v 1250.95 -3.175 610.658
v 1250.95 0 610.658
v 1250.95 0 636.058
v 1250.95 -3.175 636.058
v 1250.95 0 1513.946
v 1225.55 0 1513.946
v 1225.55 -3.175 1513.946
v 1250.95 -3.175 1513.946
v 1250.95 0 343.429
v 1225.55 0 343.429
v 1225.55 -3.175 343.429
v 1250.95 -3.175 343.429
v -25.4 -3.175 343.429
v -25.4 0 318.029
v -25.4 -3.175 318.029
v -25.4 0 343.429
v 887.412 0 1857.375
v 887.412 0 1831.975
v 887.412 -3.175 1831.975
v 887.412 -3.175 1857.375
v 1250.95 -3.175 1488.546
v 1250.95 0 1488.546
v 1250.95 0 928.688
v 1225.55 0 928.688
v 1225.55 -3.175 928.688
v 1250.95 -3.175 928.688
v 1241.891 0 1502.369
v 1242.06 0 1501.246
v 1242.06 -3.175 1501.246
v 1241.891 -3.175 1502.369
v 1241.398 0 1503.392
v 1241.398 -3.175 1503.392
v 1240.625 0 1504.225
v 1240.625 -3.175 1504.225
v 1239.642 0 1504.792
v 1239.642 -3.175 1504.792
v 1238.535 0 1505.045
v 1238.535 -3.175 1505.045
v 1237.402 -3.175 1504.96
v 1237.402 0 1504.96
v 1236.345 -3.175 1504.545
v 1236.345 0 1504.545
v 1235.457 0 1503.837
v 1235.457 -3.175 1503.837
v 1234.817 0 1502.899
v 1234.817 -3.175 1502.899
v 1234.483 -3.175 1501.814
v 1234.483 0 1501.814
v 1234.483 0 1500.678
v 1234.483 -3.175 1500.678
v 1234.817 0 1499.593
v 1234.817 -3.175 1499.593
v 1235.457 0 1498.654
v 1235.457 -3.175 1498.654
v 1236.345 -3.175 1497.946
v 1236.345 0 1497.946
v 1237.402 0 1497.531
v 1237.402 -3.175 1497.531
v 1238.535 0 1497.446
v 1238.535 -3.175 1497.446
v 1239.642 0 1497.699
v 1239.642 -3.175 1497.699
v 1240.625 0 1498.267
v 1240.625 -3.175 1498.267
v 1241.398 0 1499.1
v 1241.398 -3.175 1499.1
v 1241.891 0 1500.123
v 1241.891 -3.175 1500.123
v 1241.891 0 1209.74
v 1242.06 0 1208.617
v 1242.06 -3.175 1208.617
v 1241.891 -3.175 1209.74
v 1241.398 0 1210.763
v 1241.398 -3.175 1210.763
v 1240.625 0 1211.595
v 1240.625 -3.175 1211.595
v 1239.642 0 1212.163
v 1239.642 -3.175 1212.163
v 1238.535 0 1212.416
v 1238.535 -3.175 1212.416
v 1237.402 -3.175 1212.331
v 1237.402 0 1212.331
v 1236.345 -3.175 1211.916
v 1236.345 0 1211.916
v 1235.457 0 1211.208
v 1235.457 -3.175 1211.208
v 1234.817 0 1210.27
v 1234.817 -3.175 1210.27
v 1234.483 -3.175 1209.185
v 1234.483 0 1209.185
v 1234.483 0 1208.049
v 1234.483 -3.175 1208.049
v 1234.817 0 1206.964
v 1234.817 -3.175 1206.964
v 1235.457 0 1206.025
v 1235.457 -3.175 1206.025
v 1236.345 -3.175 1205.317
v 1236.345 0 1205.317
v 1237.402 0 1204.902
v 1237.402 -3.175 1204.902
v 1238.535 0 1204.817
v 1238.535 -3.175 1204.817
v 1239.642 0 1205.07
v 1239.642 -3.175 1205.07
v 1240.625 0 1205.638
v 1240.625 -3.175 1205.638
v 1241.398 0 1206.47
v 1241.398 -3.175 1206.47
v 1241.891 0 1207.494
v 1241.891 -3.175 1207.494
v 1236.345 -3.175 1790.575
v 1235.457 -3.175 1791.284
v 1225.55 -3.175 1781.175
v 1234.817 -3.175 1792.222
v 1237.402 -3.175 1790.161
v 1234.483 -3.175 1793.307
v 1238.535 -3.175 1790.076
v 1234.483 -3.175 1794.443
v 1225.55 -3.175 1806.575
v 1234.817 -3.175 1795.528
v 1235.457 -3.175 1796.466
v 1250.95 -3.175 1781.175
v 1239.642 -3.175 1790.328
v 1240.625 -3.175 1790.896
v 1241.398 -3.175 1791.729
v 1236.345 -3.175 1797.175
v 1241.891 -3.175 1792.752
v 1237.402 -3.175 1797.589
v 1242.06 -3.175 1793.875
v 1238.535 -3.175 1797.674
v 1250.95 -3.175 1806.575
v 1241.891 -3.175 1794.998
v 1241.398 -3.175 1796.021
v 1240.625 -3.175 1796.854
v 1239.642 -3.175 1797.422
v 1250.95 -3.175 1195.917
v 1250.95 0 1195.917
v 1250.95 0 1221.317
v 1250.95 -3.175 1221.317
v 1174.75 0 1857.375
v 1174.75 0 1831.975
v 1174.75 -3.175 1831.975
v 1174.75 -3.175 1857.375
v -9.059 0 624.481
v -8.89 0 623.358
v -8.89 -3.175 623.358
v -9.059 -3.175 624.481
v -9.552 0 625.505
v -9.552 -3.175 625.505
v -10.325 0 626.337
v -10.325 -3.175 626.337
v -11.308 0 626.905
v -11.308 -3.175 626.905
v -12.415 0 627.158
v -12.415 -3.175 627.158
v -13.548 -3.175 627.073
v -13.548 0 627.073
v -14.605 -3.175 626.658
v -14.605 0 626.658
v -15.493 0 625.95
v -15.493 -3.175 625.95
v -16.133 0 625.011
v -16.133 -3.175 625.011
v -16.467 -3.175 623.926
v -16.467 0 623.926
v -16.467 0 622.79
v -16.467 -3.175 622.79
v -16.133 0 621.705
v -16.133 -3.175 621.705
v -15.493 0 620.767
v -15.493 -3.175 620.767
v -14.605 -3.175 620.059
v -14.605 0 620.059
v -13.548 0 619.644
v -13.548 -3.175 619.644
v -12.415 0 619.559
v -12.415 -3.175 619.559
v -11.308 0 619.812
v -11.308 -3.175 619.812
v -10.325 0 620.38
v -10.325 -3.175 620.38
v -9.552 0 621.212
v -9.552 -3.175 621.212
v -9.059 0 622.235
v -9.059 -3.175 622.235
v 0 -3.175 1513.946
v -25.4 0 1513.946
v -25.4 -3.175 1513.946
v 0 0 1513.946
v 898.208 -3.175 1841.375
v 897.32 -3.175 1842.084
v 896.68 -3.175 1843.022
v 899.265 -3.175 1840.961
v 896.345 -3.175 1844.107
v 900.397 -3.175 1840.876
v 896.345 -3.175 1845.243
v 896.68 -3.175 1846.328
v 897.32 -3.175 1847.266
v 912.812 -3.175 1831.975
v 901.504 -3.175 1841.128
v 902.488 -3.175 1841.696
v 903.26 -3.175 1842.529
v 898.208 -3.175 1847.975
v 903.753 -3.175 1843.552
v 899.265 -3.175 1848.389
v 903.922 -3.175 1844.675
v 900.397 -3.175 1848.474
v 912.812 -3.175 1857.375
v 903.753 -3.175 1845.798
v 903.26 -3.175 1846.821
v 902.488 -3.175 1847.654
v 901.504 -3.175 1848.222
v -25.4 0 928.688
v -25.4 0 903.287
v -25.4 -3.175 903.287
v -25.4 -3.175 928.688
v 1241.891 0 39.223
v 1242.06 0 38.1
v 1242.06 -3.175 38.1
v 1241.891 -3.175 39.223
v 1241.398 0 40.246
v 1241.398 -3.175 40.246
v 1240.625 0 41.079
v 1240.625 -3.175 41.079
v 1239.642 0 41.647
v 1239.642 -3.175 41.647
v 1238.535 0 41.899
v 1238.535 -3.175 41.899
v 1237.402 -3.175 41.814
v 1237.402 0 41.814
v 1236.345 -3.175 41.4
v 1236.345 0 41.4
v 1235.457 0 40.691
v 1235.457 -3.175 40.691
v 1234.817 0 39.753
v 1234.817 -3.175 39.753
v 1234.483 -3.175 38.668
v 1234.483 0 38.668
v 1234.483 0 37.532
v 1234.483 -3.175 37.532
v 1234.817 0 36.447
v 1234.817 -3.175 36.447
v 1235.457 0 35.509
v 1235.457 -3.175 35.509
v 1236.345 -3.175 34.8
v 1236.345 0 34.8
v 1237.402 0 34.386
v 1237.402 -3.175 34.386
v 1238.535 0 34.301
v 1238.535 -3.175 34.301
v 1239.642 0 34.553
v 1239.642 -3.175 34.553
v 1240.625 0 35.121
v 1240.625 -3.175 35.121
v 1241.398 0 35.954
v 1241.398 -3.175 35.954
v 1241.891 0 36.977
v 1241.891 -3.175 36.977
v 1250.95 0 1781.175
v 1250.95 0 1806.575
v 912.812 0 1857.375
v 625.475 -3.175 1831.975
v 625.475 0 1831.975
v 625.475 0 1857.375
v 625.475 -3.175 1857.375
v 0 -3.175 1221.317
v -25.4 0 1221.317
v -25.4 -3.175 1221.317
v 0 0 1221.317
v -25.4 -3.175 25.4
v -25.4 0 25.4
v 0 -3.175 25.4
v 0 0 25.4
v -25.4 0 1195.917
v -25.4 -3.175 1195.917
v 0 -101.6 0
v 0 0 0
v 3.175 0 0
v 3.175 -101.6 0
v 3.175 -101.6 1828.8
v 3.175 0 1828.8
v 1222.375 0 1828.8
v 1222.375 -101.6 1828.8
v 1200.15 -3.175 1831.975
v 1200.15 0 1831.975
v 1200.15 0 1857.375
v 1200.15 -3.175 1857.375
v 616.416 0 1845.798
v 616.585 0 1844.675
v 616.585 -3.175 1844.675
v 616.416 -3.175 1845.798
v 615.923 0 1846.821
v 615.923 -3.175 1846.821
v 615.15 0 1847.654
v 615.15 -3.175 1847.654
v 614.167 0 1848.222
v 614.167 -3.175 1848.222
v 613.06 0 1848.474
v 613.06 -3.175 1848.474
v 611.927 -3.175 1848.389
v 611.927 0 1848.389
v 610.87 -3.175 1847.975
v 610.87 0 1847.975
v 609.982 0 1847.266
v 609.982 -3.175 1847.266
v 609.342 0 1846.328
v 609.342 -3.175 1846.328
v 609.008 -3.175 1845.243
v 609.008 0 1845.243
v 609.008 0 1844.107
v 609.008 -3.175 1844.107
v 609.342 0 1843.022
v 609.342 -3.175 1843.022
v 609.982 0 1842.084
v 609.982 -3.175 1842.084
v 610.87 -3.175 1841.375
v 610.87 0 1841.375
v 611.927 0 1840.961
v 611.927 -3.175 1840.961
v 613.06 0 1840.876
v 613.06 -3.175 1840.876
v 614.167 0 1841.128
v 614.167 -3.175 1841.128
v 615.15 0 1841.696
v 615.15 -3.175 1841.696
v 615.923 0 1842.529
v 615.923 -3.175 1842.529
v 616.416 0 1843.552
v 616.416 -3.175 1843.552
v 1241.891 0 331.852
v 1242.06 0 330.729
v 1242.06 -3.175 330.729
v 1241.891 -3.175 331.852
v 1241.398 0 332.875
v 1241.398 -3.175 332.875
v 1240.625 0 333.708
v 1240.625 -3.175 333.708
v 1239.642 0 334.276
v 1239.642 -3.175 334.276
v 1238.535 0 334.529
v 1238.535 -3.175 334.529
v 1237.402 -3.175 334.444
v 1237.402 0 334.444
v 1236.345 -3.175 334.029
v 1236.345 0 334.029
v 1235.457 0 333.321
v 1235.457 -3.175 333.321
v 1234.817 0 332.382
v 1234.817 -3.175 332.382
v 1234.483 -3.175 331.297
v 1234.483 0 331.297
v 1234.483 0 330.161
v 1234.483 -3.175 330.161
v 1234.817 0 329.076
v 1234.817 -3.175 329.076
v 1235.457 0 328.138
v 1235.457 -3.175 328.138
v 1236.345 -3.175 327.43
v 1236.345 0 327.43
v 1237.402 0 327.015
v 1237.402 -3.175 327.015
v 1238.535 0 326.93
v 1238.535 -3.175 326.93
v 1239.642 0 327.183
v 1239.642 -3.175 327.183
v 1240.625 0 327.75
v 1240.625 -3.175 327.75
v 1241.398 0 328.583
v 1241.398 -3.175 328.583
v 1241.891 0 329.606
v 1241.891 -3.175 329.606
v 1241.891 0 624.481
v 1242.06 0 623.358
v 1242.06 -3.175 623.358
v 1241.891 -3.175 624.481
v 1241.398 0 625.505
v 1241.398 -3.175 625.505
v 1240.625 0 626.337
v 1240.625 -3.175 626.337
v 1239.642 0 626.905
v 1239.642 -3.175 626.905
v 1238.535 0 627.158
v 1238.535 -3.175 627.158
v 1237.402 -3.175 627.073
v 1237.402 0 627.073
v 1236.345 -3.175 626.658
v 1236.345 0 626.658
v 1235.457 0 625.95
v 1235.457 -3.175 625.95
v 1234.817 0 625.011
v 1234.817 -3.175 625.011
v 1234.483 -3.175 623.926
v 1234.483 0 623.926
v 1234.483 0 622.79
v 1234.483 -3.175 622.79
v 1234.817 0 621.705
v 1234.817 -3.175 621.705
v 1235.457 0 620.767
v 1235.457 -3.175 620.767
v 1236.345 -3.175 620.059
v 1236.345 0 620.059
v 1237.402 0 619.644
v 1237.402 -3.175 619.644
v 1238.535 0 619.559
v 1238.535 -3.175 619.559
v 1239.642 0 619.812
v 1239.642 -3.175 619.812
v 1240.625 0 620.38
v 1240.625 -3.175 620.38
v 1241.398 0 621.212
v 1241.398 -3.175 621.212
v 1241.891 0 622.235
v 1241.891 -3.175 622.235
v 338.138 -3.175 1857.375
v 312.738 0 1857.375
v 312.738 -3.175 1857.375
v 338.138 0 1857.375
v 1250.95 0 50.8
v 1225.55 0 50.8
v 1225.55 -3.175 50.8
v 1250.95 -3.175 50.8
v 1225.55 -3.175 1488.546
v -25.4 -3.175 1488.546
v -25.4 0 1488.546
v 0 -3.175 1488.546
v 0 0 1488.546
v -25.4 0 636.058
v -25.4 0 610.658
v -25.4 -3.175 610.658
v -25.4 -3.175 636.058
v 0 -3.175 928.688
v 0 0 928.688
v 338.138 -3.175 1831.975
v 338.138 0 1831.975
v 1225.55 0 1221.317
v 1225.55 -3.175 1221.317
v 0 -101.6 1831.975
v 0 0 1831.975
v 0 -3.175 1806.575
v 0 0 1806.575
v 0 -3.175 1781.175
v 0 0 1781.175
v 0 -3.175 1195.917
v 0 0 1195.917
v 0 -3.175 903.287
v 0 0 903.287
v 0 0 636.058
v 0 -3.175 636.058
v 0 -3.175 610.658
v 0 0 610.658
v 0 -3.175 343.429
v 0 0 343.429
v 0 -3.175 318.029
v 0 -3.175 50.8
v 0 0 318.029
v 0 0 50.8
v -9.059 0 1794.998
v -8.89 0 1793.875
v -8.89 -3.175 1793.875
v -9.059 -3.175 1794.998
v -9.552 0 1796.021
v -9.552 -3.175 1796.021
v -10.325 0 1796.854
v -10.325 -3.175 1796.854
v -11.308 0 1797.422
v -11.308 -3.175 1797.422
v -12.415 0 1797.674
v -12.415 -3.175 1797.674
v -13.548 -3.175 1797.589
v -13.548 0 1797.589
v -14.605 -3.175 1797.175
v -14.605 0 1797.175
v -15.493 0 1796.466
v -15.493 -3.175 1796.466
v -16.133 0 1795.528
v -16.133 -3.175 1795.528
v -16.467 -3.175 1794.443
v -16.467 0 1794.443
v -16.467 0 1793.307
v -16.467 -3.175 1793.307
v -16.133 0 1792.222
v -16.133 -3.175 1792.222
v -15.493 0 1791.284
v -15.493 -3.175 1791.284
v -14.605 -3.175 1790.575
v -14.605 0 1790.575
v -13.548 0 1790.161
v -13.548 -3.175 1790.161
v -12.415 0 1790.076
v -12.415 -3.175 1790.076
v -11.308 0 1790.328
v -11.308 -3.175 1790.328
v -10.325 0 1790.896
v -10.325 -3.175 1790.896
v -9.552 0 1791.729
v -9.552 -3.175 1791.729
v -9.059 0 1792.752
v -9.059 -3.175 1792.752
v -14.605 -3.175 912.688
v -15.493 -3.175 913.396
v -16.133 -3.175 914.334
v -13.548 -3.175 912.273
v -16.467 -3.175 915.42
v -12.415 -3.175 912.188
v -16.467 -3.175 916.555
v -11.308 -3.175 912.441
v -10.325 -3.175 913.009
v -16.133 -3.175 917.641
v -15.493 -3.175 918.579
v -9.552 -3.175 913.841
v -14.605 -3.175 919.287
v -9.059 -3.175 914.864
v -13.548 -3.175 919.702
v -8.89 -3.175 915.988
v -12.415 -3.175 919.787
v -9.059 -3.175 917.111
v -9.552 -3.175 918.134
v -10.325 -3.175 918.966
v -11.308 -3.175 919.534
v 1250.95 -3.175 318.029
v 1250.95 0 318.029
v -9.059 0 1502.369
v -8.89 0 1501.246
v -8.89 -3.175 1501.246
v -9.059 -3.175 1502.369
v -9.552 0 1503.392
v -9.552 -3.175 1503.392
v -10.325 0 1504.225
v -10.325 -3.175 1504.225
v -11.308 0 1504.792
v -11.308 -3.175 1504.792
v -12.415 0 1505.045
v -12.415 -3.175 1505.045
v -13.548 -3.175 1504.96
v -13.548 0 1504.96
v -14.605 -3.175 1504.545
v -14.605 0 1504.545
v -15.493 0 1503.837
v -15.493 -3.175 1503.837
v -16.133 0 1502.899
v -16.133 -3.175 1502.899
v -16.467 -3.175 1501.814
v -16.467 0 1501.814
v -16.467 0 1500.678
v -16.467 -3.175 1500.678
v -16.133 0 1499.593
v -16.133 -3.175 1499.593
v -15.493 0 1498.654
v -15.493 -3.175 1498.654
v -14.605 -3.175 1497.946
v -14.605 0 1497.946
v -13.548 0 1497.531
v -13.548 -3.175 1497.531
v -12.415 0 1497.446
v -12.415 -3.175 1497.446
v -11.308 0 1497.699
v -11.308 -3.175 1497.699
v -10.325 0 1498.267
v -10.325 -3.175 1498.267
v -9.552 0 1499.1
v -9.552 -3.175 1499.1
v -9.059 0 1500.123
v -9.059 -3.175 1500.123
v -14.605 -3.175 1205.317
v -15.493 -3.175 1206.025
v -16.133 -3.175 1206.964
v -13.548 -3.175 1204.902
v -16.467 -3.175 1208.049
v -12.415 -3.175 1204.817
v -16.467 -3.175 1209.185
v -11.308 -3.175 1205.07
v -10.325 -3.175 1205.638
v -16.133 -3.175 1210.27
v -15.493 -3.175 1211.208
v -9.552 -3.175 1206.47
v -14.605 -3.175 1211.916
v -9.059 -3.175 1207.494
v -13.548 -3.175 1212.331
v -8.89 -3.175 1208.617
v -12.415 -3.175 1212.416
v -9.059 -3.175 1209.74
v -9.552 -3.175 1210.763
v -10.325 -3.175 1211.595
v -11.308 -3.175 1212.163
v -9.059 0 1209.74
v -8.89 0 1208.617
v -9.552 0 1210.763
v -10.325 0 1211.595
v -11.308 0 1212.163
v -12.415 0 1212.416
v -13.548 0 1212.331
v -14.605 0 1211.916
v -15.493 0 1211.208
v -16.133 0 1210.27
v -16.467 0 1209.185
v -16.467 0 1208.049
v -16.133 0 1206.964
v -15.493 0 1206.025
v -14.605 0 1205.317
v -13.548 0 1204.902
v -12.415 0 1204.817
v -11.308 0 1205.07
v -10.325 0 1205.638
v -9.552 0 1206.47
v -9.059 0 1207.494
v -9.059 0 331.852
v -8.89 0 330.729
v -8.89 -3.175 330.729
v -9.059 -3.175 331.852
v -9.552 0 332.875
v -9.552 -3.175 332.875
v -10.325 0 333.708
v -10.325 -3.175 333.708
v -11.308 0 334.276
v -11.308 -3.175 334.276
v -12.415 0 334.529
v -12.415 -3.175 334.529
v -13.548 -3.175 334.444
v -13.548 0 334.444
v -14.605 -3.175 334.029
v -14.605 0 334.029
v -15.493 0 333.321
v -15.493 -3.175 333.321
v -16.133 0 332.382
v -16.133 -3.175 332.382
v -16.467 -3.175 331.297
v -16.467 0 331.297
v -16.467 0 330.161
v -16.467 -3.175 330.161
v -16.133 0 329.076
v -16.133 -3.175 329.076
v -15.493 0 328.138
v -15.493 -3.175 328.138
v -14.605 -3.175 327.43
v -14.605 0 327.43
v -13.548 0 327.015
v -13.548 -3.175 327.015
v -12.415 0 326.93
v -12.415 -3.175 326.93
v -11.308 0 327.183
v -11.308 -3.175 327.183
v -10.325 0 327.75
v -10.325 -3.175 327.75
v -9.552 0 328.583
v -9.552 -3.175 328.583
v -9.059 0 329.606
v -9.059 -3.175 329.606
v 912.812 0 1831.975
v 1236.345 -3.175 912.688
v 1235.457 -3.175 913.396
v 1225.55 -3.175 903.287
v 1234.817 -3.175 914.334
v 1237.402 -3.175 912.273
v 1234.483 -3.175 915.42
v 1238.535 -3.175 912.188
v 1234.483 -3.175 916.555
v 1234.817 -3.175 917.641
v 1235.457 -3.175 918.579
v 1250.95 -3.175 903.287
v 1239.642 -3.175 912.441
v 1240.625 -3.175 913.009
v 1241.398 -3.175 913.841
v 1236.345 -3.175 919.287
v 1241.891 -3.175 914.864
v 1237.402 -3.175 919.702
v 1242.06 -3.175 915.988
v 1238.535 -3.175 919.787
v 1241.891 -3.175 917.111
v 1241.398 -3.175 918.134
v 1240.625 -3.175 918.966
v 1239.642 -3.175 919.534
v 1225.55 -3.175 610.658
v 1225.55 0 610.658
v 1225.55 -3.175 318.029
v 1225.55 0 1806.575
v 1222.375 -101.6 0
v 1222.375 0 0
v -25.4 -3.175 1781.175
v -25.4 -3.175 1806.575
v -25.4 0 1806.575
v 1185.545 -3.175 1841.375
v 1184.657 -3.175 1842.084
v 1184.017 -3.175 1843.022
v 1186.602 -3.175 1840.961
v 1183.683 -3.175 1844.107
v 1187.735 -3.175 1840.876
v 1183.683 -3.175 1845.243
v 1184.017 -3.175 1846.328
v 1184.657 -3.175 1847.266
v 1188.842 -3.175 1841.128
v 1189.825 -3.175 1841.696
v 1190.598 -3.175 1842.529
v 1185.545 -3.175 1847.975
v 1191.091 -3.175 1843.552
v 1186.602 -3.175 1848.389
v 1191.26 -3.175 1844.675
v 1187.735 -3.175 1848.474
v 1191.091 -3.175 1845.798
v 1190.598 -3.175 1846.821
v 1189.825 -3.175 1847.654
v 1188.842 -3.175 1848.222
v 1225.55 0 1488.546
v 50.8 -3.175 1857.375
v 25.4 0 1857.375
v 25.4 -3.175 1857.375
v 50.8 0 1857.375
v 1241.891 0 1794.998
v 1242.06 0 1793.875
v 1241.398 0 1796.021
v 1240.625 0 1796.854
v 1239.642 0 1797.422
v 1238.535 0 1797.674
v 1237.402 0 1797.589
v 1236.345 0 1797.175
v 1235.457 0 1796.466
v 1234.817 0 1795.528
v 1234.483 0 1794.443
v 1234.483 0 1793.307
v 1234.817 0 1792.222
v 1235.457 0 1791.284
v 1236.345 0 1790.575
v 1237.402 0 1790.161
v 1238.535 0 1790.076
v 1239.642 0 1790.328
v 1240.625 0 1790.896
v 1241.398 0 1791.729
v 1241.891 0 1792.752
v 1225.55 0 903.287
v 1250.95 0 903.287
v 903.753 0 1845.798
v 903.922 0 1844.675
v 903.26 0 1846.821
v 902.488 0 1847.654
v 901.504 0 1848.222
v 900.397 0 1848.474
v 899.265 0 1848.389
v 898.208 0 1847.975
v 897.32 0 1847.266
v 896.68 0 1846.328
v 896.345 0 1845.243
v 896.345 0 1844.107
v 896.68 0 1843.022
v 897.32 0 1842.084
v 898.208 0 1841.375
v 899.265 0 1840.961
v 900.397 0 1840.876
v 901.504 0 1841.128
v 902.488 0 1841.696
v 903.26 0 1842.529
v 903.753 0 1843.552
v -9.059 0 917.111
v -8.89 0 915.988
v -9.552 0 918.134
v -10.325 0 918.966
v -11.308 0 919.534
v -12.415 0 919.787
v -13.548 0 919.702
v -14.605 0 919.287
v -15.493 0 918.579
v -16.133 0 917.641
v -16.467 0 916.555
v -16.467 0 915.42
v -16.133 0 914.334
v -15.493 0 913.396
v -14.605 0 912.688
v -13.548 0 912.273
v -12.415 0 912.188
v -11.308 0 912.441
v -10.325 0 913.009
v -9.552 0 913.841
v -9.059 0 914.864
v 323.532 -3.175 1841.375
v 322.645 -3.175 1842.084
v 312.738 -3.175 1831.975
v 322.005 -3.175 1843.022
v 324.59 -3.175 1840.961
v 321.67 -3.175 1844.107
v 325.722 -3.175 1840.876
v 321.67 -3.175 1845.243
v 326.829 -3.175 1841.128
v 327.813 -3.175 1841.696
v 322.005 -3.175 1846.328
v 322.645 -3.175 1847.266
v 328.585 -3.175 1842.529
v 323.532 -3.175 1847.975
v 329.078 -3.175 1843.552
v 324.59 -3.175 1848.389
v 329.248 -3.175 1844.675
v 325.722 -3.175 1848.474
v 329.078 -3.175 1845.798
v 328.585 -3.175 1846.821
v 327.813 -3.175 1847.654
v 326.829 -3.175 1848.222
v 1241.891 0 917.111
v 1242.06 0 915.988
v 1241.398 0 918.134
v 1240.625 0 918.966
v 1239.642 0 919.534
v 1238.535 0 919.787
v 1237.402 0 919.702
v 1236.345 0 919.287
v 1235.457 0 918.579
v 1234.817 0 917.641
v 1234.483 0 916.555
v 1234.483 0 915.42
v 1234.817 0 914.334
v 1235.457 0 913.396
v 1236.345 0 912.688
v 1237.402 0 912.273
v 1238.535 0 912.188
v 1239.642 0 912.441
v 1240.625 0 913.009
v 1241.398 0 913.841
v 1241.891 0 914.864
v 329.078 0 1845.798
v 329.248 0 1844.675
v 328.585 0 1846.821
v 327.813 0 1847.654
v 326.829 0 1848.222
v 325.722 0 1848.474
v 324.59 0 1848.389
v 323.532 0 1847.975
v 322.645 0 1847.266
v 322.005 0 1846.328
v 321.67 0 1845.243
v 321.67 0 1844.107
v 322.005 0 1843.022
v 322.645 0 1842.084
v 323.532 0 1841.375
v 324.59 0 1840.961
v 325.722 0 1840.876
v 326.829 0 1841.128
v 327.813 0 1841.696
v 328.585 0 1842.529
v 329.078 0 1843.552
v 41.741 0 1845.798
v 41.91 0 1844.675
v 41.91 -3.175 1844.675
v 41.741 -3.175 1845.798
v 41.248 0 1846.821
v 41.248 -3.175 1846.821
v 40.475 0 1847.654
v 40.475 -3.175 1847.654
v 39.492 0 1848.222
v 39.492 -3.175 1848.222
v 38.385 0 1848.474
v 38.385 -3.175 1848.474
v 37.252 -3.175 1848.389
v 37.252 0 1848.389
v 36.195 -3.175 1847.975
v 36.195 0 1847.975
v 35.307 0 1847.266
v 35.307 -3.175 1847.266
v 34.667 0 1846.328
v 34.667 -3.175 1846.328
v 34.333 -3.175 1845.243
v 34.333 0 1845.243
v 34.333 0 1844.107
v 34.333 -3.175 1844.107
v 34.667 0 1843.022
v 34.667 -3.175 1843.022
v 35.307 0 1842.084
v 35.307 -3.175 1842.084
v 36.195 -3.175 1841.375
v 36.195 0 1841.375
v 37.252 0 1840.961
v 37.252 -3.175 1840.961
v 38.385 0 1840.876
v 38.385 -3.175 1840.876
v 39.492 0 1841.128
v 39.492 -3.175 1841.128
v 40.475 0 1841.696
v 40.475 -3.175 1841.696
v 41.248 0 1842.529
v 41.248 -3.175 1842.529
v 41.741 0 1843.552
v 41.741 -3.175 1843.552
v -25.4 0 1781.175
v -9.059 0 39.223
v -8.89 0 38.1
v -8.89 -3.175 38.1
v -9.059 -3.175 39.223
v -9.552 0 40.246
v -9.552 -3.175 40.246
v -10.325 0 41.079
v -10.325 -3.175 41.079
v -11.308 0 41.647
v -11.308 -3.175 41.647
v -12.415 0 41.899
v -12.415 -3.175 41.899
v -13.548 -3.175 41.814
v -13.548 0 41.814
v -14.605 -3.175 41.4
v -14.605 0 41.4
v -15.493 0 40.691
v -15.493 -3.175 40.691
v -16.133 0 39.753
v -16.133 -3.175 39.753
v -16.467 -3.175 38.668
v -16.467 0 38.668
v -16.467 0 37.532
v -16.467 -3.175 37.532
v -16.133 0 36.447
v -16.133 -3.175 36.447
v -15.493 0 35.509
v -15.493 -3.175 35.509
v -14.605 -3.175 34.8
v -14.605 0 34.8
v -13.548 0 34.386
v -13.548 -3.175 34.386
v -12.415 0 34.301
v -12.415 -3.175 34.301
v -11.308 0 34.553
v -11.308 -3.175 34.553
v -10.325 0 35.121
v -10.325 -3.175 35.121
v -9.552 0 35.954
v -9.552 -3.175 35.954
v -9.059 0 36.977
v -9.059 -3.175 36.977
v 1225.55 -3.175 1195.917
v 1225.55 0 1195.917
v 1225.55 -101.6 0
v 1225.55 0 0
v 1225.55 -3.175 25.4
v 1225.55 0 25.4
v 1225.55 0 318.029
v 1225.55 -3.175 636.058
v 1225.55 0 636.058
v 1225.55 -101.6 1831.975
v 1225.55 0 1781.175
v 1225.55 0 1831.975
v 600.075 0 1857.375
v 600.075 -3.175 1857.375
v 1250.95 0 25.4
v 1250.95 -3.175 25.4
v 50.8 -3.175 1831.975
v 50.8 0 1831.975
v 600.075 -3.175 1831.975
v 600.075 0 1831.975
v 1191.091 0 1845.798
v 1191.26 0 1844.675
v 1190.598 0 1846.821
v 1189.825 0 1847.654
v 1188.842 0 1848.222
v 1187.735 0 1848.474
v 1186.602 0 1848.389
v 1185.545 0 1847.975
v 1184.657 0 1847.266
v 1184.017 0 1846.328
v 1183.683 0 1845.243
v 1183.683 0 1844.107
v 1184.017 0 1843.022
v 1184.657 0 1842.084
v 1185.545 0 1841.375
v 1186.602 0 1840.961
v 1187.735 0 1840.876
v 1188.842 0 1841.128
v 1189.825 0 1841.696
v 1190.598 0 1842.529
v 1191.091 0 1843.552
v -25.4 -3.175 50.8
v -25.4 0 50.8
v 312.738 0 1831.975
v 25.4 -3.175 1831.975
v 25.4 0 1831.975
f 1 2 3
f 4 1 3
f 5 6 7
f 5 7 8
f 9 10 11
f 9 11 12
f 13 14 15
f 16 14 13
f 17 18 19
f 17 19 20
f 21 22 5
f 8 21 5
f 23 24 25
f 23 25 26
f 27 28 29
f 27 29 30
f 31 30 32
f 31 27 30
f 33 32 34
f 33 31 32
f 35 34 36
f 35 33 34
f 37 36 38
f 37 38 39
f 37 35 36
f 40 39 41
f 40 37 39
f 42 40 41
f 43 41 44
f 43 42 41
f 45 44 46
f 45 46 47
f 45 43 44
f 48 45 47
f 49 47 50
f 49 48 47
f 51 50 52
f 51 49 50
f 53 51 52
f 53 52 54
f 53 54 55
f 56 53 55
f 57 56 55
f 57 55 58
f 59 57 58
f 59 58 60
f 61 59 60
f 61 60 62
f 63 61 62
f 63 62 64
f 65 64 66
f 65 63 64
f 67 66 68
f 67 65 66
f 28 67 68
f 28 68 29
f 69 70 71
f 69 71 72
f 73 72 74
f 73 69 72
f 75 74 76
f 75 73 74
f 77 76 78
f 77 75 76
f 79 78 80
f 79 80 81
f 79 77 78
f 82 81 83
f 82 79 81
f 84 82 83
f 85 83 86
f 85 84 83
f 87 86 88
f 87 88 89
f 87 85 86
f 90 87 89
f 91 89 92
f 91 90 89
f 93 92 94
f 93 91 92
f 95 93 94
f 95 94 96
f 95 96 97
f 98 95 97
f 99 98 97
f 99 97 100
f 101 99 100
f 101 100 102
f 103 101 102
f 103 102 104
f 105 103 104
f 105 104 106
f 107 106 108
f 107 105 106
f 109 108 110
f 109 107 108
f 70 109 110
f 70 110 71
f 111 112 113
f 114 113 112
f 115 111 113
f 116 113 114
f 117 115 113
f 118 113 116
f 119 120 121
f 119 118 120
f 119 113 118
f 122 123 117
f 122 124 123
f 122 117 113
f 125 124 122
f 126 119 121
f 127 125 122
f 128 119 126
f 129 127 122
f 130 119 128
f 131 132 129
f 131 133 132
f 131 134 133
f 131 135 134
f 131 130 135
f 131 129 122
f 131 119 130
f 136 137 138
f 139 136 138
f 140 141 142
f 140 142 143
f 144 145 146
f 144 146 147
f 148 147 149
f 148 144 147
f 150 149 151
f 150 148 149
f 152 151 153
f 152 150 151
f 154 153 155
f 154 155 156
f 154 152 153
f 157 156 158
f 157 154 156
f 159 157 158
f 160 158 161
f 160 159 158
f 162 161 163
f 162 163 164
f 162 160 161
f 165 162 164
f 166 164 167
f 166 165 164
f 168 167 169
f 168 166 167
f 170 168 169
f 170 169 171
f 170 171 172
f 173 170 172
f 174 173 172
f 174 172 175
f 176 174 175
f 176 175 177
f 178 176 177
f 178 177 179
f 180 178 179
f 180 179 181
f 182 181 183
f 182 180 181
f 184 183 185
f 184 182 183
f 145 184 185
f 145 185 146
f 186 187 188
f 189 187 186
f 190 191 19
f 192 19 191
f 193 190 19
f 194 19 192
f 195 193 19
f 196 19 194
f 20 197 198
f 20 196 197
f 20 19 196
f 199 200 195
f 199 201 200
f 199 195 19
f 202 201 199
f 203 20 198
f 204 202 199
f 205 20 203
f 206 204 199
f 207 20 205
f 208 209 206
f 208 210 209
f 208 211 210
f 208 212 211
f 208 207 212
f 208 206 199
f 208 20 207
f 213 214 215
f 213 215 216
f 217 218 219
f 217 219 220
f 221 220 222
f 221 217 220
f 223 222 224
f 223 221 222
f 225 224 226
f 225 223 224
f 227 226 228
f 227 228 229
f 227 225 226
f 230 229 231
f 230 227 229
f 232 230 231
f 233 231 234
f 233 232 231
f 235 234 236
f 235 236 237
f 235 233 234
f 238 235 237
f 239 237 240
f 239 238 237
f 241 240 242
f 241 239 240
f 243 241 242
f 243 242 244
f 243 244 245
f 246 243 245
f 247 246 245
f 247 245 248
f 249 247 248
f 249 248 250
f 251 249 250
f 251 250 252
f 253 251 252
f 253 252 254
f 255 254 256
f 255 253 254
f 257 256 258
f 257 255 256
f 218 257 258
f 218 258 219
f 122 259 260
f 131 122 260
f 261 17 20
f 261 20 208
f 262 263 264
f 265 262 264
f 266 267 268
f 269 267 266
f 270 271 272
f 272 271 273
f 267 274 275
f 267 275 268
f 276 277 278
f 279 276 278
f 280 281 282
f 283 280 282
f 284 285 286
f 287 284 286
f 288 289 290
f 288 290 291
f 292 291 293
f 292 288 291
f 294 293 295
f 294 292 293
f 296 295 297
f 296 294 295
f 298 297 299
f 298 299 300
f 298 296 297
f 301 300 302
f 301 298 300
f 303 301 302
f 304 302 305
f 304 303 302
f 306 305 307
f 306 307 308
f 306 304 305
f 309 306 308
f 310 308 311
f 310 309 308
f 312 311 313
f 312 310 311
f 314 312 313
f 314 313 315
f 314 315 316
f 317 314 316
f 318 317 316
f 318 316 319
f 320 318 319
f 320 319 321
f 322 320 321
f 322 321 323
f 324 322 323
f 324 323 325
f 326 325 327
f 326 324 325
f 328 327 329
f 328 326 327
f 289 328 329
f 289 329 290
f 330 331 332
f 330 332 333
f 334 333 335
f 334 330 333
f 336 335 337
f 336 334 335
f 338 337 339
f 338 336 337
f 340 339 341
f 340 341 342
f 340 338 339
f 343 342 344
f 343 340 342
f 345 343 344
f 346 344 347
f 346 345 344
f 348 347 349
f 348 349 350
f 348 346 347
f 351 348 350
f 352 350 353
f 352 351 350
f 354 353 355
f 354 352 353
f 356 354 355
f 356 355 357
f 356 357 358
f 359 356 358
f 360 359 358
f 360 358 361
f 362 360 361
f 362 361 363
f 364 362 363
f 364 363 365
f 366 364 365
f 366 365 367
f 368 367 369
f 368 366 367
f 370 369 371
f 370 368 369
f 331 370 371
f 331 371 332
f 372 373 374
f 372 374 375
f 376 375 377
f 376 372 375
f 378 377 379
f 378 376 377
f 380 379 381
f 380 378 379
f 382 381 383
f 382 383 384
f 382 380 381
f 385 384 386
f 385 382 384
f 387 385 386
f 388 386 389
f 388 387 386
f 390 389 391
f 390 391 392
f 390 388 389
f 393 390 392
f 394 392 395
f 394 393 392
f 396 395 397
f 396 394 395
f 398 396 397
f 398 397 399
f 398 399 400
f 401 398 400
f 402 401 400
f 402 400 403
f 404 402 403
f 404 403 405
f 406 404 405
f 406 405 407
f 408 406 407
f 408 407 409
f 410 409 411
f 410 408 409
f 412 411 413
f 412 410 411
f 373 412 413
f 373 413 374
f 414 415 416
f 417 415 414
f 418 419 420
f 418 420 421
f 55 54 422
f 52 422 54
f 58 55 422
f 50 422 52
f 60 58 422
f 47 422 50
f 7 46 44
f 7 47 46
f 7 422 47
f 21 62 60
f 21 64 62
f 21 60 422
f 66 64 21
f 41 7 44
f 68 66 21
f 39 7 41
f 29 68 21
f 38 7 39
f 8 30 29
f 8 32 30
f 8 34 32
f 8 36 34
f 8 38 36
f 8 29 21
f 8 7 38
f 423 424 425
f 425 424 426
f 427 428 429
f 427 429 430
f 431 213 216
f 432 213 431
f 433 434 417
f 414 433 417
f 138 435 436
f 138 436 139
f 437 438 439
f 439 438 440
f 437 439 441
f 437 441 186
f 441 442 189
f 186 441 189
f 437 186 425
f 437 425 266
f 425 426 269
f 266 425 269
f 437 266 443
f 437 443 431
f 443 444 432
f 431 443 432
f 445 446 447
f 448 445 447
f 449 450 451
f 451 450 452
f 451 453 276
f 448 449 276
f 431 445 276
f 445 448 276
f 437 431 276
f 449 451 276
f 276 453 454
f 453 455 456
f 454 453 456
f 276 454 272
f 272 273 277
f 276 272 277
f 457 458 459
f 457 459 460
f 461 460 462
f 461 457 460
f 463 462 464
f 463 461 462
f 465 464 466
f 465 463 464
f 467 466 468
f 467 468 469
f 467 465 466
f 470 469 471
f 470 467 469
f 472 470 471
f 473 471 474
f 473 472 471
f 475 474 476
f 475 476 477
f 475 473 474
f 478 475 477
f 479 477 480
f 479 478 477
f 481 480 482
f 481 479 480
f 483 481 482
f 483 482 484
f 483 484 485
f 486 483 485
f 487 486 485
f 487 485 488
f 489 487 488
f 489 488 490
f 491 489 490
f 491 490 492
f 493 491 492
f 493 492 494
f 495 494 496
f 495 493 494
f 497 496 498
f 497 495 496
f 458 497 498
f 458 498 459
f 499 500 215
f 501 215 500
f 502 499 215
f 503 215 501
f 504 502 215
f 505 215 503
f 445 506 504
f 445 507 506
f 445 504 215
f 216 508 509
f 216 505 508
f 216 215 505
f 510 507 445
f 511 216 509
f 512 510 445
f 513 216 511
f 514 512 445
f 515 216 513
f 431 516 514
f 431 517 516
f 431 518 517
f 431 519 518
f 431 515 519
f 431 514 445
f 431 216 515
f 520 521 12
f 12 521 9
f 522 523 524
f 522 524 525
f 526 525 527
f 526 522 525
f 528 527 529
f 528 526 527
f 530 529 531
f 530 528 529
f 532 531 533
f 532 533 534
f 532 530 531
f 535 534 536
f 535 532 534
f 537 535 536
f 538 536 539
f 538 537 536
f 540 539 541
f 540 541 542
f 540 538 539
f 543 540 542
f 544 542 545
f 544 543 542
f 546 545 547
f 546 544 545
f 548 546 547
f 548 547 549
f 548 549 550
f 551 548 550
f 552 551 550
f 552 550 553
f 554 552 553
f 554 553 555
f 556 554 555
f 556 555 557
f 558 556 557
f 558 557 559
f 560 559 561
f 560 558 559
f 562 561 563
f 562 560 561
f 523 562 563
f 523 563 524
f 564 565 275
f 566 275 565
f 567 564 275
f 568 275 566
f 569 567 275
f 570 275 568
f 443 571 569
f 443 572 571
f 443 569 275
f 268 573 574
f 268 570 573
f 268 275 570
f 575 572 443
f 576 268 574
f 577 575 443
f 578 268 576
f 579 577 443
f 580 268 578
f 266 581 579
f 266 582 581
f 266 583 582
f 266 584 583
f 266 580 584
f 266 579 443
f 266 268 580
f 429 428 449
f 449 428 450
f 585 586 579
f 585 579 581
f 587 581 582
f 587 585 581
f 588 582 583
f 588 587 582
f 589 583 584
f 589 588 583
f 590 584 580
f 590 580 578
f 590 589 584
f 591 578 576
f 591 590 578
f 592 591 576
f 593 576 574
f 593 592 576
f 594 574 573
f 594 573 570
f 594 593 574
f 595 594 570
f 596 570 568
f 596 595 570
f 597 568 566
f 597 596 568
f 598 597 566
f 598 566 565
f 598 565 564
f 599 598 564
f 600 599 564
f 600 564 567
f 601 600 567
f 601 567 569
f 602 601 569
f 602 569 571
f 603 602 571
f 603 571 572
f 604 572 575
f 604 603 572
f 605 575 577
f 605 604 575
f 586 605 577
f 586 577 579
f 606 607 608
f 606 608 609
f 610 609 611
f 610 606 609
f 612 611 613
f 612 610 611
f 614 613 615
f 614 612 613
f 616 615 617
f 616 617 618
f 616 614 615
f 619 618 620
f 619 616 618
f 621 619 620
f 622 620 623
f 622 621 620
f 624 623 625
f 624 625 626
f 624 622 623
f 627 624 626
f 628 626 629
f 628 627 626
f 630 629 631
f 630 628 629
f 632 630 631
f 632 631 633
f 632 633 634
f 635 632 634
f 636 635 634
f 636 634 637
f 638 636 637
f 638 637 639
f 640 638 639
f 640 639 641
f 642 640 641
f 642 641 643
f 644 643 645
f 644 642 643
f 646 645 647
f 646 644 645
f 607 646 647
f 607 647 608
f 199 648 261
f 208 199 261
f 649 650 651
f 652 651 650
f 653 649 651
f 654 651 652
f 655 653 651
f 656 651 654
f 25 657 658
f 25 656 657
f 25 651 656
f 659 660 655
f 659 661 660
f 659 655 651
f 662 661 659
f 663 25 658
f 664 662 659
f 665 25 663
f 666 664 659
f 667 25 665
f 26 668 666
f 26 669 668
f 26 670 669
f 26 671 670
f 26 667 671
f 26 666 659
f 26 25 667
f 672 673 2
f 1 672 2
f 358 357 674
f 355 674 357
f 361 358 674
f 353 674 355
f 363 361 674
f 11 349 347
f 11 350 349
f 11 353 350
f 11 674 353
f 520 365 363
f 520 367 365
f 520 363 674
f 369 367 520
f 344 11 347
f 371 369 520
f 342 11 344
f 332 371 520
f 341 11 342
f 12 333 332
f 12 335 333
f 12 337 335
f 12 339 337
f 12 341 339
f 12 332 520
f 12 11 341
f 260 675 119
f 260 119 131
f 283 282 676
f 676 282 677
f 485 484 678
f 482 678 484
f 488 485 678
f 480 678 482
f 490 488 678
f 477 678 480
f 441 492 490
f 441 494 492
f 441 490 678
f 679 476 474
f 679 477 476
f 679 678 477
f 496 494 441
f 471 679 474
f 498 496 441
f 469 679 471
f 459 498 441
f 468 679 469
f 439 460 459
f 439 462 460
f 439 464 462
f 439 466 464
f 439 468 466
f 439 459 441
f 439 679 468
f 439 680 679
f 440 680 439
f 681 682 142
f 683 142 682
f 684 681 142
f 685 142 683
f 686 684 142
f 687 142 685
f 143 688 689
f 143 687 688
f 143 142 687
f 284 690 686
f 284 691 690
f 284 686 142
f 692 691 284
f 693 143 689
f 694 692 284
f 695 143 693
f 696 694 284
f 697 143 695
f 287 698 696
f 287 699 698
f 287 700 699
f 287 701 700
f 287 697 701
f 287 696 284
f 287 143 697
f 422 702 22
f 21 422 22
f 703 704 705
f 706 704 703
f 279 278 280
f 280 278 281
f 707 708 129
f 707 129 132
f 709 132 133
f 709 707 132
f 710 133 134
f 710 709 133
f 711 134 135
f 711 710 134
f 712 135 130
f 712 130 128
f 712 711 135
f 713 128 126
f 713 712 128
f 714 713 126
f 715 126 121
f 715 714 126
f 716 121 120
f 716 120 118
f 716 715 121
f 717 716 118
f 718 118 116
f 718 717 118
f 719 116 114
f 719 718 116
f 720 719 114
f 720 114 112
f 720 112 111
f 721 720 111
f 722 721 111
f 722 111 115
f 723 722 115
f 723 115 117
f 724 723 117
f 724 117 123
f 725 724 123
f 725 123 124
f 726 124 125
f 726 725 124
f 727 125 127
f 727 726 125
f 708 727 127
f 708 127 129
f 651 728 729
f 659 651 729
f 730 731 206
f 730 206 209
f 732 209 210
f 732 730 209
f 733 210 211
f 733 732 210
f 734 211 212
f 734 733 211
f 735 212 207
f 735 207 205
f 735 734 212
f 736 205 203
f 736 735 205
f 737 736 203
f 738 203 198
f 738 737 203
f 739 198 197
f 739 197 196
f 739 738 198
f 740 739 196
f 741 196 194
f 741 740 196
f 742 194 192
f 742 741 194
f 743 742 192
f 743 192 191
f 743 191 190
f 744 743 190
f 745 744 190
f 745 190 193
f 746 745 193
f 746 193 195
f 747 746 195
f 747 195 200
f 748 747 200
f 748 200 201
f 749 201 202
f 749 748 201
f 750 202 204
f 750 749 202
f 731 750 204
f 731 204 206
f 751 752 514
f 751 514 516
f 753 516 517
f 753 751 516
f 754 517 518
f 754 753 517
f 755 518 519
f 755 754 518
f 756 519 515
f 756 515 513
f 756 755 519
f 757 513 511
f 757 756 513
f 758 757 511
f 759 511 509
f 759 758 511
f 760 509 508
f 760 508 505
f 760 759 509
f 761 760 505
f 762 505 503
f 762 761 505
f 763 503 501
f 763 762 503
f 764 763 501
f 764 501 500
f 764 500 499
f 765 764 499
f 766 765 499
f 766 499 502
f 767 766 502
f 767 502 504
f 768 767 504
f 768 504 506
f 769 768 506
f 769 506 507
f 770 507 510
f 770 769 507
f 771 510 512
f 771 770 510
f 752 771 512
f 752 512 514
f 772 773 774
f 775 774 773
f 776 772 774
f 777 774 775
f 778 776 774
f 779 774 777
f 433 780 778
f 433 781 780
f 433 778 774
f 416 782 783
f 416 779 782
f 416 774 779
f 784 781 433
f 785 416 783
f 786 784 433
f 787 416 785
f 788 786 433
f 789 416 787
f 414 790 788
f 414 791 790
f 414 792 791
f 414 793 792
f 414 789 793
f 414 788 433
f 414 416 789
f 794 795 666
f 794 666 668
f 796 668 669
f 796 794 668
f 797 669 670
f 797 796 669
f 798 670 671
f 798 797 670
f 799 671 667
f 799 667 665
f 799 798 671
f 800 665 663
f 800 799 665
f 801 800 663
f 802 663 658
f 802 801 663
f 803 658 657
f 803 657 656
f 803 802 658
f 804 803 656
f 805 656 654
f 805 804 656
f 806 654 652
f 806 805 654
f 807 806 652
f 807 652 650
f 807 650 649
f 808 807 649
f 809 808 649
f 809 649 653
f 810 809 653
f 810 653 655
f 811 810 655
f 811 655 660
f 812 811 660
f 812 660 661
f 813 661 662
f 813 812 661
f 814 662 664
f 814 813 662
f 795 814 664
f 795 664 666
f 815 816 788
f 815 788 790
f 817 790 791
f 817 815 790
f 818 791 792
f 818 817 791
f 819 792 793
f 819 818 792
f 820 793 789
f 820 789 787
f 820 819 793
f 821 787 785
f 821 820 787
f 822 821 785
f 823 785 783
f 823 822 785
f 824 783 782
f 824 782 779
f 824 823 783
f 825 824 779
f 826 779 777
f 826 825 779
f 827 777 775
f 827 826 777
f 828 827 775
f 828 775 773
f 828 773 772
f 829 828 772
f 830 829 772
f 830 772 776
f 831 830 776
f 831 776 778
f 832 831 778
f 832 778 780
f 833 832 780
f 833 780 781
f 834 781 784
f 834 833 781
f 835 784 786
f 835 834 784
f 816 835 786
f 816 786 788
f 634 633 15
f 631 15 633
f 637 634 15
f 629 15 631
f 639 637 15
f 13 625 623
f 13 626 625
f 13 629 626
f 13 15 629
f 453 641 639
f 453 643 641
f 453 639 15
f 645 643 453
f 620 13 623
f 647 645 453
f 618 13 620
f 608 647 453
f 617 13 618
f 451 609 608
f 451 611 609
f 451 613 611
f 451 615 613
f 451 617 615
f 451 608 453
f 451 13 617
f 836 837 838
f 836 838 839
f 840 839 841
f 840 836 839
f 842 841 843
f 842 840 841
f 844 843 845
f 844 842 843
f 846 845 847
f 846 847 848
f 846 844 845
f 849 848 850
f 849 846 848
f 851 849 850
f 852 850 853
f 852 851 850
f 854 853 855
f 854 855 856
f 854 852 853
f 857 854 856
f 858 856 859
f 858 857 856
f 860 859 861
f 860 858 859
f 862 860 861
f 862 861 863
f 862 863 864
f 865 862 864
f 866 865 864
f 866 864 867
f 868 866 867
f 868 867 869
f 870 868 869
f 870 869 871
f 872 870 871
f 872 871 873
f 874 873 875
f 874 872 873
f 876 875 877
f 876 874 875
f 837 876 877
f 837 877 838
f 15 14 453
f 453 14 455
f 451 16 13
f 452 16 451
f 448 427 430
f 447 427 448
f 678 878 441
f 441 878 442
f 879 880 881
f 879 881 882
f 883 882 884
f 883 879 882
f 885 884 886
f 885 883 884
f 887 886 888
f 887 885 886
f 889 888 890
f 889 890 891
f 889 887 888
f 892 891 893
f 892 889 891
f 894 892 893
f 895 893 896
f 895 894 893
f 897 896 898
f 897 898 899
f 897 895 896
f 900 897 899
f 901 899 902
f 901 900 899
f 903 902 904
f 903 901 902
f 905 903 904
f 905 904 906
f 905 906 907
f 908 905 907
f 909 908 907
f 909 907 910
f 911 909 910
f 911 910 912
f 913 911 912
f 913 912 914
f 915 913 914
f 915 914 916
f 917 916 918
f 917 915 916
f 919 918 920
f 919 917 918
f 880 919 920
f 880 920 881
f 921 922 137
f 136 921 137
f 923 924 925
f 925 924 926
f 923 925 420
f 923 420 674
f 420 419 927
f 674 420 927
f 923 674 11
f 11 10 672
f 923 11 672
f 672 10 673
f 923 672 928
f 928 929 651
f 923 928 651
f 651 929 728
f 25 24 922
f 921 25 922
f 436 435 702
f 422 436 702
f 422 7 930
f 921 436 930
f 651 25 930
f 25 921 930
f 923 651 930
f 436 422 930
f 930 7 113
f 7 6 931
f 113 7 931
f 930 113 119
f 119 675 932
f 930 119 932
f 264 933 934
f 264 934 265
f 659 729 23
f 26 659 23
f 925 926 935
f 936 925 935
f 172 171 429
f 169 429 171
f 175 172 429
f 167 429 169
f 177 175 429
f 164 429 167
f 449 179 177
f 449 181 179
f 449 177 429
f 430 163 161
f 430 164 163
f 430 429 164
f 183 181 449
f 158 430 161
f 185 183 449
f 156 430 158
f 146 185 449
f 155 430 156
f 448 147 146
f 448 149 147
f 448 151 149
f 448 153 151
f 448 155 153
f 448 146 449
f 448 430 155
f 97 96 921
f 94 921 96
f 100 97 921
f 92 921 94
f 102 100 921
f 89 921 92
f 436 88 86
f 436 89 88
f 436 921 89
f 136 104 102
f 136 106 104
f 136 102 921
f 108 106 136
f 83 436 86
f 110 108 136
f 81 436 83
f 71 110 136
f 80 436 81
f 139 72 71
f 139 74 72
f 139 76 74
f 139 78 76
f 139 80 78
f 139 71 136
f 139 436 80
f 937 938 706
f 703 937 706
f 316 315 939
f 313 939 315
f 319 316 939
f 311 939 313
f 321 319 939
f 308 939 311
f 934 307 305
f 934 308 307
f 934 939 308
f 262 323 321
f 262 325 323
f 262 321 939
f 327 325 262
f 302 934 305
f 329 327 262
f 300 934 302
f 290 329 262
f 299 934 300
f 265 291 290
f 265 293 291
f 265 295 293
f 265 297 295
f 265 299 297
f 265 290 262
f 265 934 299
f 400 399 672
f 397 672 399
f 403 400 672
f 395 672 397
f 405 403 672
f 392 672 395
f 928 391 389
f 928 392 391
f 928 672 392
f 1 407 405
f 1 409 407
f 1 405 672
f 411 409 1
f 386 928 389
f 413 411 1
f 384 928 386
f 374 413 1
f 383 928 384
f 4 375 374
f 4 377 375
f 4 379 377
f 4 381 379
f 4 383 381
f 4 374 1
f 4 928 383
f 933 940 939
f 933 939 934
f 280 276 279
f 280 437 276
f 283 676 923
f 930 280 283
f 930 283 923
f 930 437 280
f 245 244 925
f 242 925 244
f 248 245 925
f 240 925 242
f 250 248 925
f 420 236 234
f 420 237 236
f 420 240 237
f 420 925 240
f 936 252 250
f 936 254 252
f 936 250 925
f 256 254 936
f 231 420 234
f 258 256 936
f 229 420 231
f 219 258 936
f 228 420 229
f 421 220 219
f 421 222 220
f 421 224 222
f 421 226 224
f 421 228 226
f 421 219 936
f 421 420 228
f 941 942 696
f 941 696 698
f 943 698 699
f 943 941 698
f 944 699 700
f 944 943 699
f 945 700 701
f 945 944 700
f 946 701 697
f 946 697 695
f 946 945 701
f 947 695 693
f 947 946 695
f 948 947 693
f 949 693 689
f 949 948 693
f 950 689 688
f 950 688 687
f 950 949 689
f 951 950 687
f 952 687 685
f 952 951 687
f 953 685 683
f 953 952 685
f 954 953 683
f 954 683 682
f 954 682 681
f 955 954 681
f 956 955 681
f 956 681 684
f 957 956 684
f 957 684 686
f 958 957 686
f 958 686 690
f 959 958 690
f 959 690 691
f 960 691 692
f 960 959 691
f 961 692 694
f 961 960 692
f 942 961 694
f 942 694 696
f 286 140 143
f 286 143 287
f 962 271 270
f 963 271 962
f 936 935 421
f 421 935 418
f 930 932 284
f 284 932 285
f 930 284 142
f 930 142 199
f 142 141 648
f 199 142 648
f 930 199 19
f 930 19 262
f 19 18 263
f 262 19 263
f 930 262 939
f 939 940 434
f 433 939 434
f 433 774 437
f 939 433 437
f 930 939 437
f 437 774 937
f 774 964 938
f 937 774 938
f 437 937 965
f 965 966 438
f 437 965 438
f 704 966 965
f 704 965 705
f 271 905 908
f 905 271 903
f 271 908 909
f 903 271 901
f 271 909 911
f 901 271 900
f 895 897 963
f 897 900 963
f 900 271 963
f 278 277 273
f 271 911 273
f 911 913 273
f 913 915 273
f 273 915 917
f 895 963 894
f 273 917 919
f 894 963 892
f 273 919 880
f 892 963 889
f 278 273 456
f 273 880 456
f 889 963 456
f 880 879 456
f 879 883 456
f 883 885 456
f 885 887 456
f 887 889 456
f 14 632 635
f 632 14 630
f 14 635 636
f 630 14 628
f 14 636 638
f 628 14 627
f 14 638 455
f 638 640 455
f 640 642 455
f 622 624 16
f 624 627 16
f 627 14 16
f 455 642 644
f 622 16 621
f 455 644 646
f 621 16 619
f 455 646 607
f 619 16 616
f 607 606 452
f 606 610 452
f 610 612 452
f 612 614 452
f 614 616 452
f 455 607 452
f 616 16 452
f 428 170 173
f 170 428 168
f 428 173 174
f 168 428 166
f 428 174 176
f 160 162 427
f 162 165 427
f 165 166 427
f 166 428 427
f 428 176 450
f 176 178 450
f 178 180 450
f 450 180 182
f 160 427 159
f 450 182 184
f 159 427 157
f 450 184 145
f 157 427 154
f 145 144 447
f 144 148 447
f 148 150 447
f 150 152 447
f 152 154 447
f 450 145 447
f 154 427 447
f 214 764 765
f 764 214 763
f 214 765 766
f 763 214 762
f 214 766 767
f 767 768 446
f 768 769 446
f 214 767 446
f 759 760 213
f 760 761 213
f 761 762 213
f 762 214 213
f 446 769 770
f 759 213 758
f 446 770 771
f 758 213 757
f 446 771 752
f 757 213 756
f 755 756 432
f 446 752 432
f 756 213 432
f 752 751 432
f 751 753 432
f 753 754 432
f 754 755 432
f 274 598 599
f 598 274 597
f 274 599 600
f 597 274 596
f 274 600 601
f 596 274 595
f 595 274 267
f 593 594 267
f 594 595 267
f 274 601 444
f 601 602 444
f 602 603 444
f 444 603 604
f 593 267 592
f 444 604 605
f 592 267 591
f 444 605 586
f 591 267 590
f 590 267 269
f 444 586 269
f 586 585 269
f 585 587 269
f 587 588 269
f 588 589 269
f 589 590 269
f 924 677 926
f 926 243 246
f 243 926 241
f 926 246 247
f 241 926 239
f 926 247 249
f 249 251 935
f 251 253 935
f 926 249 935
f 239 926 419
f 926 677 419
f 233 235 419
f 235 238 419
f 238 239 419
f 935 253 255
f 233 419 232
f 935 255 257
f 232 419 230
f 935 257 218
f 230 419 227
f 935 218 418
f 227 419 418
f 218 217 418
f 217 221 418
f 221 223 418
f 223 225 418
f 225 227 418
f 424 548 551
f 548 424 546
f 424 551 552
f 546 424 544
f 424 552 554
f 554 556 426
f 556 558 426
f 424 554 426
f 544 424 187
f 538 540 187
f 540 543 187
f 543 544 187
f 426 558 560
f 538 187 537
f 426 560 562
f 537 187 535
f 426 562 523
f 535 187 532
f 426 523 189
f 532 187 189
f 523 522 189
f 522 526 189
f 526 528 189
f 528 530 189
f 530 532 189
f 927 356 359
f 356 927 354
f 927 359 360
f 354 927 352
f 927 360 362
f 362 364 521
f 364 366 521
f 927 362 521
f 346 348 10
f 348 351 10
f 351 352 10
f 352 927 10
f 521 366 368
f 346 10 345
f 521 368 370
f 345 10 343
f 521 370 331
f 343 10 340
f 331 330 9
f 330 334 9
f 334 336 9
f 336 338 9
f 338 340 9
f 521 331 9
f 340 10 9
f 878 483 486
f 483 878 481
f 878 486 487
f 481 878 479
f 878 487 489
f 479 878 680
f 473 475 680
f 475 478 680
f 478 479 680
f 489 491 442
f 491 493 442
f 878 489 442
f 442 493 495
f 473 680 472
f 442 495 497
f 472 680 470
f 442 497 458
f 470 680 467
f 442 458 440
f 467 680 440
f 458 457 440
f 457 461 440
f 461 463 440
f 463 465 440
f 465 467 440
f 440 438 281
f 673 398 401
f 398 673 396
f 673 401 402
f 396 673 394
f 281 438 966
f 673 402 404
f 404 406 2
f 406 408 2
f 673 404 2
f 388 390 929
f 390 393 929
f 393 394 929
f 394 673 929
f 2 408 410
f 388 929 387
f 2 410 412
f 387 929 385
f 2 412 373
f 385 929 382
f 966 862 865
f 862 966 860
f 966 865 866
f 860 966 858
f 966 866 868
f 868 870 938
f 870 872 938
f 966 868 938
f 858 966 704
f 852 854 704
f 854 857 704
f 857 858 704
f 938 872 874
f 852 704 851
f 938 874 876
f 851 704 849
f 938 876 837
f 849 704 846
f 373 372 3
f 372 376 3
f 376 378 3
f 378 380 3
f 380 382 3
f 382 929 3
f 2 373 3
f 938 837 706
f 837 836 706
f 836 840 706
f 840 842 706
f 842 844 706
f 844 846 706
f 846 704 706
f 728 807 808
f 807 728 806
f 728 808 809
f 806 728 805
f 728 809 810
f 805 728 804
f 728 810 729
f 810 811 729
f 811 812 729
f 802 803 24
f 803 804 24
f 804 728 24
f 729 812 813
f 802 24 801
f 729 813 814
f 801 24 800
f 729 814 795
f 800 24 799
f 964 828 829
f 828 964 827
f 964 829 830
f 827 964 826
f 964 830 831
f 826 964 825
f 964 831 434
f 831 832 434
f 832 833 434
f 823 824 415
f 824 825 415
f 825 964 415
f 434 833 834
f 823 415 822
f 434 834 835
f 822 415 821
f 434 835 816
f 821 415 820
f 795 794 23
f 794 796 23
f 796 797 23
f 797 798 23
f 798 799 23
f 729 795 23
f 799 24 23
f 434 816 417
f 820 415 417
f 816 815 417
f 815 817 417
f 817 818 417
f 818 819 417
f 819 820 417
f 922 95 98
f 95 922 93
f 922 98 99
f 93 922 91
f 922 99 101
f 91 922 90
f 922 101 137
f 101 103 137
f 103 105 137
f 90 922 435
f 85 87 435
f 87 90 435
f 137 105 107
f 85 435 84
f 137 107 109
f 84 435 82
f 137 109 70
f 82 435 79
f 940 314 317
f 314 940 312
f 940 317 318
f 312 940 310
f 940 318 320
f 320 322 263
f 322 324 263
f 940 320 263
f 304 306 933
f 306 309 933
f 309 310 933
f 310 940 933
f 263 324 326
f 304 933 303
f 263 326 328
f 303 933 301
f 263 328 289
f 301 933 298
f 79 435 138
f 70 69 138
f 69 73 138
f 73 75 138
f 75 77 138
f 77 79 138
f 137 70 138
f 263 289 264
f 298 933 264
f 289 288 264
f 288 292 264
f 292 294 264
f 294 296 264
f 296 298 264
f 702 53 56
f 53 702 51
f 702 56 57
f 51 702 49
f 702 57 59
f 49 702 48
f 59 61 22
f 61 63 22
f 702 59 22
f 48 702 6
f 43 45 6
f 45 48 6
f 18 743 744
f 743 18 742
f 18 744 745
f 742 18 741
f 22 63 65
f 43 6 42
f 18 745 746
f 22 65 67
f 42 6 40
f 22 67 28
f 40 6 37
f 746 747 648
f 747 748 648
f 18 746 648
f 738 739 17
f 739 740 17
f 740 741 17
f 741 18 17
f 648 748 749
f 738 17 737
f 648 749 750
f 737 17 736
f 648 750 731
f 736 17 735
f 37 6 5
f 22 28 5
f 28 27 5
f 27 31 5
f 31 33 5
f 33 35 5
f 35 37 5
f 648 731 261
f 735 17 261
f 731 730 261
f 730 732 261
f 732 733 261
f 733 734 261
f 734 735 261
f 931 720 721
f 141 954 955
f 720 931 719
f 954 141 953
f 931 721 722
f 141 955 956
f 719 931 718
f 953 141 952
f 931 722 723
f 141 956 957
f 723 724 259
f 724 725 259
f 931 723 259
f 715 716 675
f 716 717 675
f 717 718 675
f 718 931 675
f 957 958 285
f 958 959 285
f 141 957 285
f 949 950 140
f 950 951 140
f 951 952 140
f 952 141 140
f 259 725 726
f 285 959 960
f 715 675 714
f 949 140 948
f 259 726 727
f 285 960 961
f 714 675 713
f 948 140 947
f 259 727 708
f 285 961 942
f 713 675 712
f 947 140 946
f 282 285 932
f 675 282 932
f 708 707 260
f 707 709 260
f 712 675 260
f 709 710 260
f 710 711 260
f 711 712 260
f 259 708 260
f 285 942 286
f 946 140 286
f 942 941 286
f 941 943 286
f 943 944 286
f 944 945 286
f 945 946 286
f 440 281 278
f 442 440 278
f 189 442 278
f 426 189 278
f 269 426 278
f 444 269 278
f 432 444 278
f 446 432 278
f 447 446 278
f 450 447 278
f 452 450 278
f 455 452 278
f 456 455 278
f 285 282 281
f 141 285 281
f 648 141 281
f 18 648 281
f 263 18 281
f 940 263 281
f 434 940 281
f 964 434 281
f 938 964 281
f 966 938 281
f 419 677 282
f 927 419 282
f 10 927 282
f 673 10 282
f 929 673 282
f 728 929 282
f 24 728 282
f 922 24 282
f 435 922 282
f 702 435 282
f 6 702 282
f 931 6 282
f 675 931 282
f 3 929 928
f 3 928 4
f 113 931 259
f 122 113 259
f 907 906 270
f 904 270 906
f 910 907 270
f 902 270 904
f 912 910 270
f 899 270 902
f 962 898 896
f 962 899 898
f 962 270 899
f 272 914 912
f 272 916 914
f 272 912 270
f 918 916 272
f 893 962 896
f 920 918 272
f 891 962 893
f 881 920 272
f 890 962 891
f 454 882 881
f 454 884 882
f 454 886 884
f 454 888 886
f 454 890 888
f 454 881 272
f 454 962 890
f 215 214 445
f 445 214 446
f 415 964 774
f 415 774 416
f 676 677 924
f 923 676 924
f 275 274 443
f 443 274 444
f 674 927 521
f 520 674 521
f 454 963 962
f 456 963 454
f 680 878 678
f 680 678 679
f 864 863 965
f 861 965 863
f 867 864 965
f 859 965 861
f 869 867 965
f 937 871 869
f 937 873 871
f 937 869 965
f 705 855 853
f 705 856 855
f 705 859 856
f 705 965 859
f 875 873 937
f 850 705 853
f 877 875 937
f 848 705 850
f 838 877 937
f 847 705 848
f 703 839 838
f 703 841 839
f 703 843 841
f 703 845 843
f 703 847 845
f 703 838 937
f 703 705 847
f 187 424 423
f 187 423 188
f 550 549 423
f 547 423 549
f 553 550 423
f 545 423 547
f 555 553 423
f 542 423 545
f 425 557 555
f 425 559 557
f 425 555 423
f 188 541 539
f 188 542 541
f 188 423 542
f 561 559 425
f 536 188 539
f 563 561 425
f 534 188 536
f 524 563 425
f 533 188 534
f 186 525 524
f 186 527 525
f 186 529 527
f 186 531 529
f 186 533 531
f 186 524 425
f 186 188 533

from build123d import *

# Parameters (mm, degrees)
F1_DEPTH = 101.6
F0_W     = 25.4
F0_H     = 25.4
F0_R     = 3.81
F2_DEPTH = 3.175


# Not quite as in the source:
# - a feature names something its author has since deleted; it is built from what else it names


with BuildPart() as f1:
    # F0 (on Front) → F1 (new body)
    with BuildSketch(Plane.XZ):
        Polygon((0, 25.4), (0, 0), (3.175, 0), (3.175, 1828.8), (1222.375, 1828.8), (1222.375, 0), (1225.55, 0), (1225.55, 25.4), (1225.55, 50.8), (1225.55, 318.0291666667), (1225.55, 343.4291666667), (1225.55, 610.6583333333), (1225.55, 636.0583333333), (1225.55, 903.2875), (1225.55, 928.6875), (1225.55, 1195.9166666667), (1225.55, 1221.3166666667), (1225.55, 1488.5458333333), (1225.55, 1513.9458333333), (1225.55, 1781.175), (1225.55, 1806.575), (1225.55, 1831.975), (1200.15, 1831.975), (1174.75, 1831.975), (912.8125, 1831.975), (887.4125, 1831.975), (625.475, 1831.975), (600.075, 1831.975), (338.1375, 1831.975), (312.7375, 1831.975), (50.8, 1831.975), (25.4, 1831.975), (0, 1831.975), (0, 1806.575), (0, 1781.175), (0, 1513.9458333333), (0, 1488.5458333333), (0, 1221.3166666667), (0, 1195.9166666667), (0, 928.6875), (0, 903.2875), (0, 636.0583333333), (0, 610.6583333333), (0, 343.4291666667), (0, 318.0291666667), (0, 50.8), align=None)
    extrude(amount=F1_DEPTH)

    # F0 (on Front) → F2 (join)
    with BuildSketch(Plane.XZ):
        with Locations((-12.7, 38.1)):
            Rectangle(F0_W, F0_H)
        with Locations((-12.7, 38.1)):
            Circle(F0_R, mode=Mode.SUBTRACT)
        with Locations((-12.7, 330.7291666667)):
            Rectangle(F0_W, F0_H)
        with Locations((-12.7, 330.7291666667)):
            Circle(F0_R, mode=Mode.SUBTRACT)
        with Locations((-12.7, 623.3583333333)):
            Rectangle(F0_W, F0_H)
        with Locations((-12.7, 623.3583333333)):
            Circle(F0_R, mode=Mode.SUBTRACT)
        with Locations((1238.25, 38.1)):
            Rectangle(F0_W, F0_H)
        with Locations((1238.25, 38.1)):
            Circle(F0_R, mode=Mode.SUBTRACT)
        with Locations((-12.7, 915.9875)):
            Rectangle(F0_W, F0_H)
        with Locations((-12.7, 915.9875)):
            Circle(F0_R, mode=Mode.SUBTRACT)
        with Locations((1238.25, 330.7291666667)):
            Rectangle(F0_W, F0_H)
        with Locations((1238.25, 330.7291666667)):
            Circle(F0_R, mode=Mode.SUBTRACT)
        with Locations((-12.7, 1208.6166666667)):
            Rectangle(F0_W, F0_H)
        with Locations((-12.7, 1208.6166666667)):
            Circle(F0_R, mode=Mode.SUBTRACT)
        with Locations((1238.25, 623.3583333333)):
            Rectangle(F0_W, F0_H)
        with Locations((1238.25, 623.3583333333)):
            Circle(F0_R, mode=Mode.SUBTRACT)
        with Locations((-12.7, 1501.2458333333)):
            Rectangle(F0_W, F0_H)
        with Locations((-12.7, 1501.2458333333)):
            Circle(F0_R, mode=Mode.SUBTRACT)
        with Locations((1238.25, 915.9875)):
            Rectangle(F0_W, F0_H)
        with Locations((1238.25, 915.9875)):
            Circle(F0_R, mode=Mode.SUBTRACT)
        with Locations((-12.7, 1793.875)):
            Rectangle(F0_W, F0_H)
        with Locations((-12.7, 1793.875)):
            Circle(F0_R, mode=Mode.SUBTRACT)
        with Locations((1238.25, 1208.6166666667)):
            Rectangle(F0_W, F0_H)
        with Locations((1238.25, 1208.6166666667)):
            Circle(F0_R, mode=Mode.SUBTRACT)
        with Locations((38.1, 1844.675)):
            Rectangle(F0_W, F0_H)
        with Locations((38.1, 1844.675)):
            Circle(F0_R, mode=Mode.SUBTRACT)
        with Locations((1238.25, 1501.2458333333)):
            Rectangle(F0_W, F0_H)
        with Locations((1238.25, 1501.2458333333)):
            Circle(F0_R, mode=Mode.SUBTRACT)
        with Locations((325.4375, 1844.675)):
            Rectangle(F0_W, F0_H)
        with Locations((325.4375, 1844.675)):
            Circle(F0_R, mode=Mode.SUBTRACT)
        with Locations((1238.25, 1793.875)):
            Rectangle(F0_W, F0_H)
        with Locations((1238.25, 1793.875)):
            Circle(F0_R, mode=Mode.SUBTRACT)
        with Locations((612.775, 1844.675)):
            Rectangle(F0_W, F0_H)
        with Locations((612.775, 1844.675)):
            Circle(F0_R, mode=Mode.SUBTRACT)
        with Locations((1187.45, 1844.675)):
            Rectangle(F0_W, F0_H)
        with Locations((1187.45, 1844.675)):
            Circle(F0_R, mode=Mode.SUBTRACT)
        with Locations((900.1125, 1844.675)):
            Rectangle(F0_W, F0_H)
        with Locations((900.1125, 1844.675)):
            Circle(F0_R, mode=Mode.SUBTRACT)
    extrude(amount=F2_DEPTH)


solid = f1.part
